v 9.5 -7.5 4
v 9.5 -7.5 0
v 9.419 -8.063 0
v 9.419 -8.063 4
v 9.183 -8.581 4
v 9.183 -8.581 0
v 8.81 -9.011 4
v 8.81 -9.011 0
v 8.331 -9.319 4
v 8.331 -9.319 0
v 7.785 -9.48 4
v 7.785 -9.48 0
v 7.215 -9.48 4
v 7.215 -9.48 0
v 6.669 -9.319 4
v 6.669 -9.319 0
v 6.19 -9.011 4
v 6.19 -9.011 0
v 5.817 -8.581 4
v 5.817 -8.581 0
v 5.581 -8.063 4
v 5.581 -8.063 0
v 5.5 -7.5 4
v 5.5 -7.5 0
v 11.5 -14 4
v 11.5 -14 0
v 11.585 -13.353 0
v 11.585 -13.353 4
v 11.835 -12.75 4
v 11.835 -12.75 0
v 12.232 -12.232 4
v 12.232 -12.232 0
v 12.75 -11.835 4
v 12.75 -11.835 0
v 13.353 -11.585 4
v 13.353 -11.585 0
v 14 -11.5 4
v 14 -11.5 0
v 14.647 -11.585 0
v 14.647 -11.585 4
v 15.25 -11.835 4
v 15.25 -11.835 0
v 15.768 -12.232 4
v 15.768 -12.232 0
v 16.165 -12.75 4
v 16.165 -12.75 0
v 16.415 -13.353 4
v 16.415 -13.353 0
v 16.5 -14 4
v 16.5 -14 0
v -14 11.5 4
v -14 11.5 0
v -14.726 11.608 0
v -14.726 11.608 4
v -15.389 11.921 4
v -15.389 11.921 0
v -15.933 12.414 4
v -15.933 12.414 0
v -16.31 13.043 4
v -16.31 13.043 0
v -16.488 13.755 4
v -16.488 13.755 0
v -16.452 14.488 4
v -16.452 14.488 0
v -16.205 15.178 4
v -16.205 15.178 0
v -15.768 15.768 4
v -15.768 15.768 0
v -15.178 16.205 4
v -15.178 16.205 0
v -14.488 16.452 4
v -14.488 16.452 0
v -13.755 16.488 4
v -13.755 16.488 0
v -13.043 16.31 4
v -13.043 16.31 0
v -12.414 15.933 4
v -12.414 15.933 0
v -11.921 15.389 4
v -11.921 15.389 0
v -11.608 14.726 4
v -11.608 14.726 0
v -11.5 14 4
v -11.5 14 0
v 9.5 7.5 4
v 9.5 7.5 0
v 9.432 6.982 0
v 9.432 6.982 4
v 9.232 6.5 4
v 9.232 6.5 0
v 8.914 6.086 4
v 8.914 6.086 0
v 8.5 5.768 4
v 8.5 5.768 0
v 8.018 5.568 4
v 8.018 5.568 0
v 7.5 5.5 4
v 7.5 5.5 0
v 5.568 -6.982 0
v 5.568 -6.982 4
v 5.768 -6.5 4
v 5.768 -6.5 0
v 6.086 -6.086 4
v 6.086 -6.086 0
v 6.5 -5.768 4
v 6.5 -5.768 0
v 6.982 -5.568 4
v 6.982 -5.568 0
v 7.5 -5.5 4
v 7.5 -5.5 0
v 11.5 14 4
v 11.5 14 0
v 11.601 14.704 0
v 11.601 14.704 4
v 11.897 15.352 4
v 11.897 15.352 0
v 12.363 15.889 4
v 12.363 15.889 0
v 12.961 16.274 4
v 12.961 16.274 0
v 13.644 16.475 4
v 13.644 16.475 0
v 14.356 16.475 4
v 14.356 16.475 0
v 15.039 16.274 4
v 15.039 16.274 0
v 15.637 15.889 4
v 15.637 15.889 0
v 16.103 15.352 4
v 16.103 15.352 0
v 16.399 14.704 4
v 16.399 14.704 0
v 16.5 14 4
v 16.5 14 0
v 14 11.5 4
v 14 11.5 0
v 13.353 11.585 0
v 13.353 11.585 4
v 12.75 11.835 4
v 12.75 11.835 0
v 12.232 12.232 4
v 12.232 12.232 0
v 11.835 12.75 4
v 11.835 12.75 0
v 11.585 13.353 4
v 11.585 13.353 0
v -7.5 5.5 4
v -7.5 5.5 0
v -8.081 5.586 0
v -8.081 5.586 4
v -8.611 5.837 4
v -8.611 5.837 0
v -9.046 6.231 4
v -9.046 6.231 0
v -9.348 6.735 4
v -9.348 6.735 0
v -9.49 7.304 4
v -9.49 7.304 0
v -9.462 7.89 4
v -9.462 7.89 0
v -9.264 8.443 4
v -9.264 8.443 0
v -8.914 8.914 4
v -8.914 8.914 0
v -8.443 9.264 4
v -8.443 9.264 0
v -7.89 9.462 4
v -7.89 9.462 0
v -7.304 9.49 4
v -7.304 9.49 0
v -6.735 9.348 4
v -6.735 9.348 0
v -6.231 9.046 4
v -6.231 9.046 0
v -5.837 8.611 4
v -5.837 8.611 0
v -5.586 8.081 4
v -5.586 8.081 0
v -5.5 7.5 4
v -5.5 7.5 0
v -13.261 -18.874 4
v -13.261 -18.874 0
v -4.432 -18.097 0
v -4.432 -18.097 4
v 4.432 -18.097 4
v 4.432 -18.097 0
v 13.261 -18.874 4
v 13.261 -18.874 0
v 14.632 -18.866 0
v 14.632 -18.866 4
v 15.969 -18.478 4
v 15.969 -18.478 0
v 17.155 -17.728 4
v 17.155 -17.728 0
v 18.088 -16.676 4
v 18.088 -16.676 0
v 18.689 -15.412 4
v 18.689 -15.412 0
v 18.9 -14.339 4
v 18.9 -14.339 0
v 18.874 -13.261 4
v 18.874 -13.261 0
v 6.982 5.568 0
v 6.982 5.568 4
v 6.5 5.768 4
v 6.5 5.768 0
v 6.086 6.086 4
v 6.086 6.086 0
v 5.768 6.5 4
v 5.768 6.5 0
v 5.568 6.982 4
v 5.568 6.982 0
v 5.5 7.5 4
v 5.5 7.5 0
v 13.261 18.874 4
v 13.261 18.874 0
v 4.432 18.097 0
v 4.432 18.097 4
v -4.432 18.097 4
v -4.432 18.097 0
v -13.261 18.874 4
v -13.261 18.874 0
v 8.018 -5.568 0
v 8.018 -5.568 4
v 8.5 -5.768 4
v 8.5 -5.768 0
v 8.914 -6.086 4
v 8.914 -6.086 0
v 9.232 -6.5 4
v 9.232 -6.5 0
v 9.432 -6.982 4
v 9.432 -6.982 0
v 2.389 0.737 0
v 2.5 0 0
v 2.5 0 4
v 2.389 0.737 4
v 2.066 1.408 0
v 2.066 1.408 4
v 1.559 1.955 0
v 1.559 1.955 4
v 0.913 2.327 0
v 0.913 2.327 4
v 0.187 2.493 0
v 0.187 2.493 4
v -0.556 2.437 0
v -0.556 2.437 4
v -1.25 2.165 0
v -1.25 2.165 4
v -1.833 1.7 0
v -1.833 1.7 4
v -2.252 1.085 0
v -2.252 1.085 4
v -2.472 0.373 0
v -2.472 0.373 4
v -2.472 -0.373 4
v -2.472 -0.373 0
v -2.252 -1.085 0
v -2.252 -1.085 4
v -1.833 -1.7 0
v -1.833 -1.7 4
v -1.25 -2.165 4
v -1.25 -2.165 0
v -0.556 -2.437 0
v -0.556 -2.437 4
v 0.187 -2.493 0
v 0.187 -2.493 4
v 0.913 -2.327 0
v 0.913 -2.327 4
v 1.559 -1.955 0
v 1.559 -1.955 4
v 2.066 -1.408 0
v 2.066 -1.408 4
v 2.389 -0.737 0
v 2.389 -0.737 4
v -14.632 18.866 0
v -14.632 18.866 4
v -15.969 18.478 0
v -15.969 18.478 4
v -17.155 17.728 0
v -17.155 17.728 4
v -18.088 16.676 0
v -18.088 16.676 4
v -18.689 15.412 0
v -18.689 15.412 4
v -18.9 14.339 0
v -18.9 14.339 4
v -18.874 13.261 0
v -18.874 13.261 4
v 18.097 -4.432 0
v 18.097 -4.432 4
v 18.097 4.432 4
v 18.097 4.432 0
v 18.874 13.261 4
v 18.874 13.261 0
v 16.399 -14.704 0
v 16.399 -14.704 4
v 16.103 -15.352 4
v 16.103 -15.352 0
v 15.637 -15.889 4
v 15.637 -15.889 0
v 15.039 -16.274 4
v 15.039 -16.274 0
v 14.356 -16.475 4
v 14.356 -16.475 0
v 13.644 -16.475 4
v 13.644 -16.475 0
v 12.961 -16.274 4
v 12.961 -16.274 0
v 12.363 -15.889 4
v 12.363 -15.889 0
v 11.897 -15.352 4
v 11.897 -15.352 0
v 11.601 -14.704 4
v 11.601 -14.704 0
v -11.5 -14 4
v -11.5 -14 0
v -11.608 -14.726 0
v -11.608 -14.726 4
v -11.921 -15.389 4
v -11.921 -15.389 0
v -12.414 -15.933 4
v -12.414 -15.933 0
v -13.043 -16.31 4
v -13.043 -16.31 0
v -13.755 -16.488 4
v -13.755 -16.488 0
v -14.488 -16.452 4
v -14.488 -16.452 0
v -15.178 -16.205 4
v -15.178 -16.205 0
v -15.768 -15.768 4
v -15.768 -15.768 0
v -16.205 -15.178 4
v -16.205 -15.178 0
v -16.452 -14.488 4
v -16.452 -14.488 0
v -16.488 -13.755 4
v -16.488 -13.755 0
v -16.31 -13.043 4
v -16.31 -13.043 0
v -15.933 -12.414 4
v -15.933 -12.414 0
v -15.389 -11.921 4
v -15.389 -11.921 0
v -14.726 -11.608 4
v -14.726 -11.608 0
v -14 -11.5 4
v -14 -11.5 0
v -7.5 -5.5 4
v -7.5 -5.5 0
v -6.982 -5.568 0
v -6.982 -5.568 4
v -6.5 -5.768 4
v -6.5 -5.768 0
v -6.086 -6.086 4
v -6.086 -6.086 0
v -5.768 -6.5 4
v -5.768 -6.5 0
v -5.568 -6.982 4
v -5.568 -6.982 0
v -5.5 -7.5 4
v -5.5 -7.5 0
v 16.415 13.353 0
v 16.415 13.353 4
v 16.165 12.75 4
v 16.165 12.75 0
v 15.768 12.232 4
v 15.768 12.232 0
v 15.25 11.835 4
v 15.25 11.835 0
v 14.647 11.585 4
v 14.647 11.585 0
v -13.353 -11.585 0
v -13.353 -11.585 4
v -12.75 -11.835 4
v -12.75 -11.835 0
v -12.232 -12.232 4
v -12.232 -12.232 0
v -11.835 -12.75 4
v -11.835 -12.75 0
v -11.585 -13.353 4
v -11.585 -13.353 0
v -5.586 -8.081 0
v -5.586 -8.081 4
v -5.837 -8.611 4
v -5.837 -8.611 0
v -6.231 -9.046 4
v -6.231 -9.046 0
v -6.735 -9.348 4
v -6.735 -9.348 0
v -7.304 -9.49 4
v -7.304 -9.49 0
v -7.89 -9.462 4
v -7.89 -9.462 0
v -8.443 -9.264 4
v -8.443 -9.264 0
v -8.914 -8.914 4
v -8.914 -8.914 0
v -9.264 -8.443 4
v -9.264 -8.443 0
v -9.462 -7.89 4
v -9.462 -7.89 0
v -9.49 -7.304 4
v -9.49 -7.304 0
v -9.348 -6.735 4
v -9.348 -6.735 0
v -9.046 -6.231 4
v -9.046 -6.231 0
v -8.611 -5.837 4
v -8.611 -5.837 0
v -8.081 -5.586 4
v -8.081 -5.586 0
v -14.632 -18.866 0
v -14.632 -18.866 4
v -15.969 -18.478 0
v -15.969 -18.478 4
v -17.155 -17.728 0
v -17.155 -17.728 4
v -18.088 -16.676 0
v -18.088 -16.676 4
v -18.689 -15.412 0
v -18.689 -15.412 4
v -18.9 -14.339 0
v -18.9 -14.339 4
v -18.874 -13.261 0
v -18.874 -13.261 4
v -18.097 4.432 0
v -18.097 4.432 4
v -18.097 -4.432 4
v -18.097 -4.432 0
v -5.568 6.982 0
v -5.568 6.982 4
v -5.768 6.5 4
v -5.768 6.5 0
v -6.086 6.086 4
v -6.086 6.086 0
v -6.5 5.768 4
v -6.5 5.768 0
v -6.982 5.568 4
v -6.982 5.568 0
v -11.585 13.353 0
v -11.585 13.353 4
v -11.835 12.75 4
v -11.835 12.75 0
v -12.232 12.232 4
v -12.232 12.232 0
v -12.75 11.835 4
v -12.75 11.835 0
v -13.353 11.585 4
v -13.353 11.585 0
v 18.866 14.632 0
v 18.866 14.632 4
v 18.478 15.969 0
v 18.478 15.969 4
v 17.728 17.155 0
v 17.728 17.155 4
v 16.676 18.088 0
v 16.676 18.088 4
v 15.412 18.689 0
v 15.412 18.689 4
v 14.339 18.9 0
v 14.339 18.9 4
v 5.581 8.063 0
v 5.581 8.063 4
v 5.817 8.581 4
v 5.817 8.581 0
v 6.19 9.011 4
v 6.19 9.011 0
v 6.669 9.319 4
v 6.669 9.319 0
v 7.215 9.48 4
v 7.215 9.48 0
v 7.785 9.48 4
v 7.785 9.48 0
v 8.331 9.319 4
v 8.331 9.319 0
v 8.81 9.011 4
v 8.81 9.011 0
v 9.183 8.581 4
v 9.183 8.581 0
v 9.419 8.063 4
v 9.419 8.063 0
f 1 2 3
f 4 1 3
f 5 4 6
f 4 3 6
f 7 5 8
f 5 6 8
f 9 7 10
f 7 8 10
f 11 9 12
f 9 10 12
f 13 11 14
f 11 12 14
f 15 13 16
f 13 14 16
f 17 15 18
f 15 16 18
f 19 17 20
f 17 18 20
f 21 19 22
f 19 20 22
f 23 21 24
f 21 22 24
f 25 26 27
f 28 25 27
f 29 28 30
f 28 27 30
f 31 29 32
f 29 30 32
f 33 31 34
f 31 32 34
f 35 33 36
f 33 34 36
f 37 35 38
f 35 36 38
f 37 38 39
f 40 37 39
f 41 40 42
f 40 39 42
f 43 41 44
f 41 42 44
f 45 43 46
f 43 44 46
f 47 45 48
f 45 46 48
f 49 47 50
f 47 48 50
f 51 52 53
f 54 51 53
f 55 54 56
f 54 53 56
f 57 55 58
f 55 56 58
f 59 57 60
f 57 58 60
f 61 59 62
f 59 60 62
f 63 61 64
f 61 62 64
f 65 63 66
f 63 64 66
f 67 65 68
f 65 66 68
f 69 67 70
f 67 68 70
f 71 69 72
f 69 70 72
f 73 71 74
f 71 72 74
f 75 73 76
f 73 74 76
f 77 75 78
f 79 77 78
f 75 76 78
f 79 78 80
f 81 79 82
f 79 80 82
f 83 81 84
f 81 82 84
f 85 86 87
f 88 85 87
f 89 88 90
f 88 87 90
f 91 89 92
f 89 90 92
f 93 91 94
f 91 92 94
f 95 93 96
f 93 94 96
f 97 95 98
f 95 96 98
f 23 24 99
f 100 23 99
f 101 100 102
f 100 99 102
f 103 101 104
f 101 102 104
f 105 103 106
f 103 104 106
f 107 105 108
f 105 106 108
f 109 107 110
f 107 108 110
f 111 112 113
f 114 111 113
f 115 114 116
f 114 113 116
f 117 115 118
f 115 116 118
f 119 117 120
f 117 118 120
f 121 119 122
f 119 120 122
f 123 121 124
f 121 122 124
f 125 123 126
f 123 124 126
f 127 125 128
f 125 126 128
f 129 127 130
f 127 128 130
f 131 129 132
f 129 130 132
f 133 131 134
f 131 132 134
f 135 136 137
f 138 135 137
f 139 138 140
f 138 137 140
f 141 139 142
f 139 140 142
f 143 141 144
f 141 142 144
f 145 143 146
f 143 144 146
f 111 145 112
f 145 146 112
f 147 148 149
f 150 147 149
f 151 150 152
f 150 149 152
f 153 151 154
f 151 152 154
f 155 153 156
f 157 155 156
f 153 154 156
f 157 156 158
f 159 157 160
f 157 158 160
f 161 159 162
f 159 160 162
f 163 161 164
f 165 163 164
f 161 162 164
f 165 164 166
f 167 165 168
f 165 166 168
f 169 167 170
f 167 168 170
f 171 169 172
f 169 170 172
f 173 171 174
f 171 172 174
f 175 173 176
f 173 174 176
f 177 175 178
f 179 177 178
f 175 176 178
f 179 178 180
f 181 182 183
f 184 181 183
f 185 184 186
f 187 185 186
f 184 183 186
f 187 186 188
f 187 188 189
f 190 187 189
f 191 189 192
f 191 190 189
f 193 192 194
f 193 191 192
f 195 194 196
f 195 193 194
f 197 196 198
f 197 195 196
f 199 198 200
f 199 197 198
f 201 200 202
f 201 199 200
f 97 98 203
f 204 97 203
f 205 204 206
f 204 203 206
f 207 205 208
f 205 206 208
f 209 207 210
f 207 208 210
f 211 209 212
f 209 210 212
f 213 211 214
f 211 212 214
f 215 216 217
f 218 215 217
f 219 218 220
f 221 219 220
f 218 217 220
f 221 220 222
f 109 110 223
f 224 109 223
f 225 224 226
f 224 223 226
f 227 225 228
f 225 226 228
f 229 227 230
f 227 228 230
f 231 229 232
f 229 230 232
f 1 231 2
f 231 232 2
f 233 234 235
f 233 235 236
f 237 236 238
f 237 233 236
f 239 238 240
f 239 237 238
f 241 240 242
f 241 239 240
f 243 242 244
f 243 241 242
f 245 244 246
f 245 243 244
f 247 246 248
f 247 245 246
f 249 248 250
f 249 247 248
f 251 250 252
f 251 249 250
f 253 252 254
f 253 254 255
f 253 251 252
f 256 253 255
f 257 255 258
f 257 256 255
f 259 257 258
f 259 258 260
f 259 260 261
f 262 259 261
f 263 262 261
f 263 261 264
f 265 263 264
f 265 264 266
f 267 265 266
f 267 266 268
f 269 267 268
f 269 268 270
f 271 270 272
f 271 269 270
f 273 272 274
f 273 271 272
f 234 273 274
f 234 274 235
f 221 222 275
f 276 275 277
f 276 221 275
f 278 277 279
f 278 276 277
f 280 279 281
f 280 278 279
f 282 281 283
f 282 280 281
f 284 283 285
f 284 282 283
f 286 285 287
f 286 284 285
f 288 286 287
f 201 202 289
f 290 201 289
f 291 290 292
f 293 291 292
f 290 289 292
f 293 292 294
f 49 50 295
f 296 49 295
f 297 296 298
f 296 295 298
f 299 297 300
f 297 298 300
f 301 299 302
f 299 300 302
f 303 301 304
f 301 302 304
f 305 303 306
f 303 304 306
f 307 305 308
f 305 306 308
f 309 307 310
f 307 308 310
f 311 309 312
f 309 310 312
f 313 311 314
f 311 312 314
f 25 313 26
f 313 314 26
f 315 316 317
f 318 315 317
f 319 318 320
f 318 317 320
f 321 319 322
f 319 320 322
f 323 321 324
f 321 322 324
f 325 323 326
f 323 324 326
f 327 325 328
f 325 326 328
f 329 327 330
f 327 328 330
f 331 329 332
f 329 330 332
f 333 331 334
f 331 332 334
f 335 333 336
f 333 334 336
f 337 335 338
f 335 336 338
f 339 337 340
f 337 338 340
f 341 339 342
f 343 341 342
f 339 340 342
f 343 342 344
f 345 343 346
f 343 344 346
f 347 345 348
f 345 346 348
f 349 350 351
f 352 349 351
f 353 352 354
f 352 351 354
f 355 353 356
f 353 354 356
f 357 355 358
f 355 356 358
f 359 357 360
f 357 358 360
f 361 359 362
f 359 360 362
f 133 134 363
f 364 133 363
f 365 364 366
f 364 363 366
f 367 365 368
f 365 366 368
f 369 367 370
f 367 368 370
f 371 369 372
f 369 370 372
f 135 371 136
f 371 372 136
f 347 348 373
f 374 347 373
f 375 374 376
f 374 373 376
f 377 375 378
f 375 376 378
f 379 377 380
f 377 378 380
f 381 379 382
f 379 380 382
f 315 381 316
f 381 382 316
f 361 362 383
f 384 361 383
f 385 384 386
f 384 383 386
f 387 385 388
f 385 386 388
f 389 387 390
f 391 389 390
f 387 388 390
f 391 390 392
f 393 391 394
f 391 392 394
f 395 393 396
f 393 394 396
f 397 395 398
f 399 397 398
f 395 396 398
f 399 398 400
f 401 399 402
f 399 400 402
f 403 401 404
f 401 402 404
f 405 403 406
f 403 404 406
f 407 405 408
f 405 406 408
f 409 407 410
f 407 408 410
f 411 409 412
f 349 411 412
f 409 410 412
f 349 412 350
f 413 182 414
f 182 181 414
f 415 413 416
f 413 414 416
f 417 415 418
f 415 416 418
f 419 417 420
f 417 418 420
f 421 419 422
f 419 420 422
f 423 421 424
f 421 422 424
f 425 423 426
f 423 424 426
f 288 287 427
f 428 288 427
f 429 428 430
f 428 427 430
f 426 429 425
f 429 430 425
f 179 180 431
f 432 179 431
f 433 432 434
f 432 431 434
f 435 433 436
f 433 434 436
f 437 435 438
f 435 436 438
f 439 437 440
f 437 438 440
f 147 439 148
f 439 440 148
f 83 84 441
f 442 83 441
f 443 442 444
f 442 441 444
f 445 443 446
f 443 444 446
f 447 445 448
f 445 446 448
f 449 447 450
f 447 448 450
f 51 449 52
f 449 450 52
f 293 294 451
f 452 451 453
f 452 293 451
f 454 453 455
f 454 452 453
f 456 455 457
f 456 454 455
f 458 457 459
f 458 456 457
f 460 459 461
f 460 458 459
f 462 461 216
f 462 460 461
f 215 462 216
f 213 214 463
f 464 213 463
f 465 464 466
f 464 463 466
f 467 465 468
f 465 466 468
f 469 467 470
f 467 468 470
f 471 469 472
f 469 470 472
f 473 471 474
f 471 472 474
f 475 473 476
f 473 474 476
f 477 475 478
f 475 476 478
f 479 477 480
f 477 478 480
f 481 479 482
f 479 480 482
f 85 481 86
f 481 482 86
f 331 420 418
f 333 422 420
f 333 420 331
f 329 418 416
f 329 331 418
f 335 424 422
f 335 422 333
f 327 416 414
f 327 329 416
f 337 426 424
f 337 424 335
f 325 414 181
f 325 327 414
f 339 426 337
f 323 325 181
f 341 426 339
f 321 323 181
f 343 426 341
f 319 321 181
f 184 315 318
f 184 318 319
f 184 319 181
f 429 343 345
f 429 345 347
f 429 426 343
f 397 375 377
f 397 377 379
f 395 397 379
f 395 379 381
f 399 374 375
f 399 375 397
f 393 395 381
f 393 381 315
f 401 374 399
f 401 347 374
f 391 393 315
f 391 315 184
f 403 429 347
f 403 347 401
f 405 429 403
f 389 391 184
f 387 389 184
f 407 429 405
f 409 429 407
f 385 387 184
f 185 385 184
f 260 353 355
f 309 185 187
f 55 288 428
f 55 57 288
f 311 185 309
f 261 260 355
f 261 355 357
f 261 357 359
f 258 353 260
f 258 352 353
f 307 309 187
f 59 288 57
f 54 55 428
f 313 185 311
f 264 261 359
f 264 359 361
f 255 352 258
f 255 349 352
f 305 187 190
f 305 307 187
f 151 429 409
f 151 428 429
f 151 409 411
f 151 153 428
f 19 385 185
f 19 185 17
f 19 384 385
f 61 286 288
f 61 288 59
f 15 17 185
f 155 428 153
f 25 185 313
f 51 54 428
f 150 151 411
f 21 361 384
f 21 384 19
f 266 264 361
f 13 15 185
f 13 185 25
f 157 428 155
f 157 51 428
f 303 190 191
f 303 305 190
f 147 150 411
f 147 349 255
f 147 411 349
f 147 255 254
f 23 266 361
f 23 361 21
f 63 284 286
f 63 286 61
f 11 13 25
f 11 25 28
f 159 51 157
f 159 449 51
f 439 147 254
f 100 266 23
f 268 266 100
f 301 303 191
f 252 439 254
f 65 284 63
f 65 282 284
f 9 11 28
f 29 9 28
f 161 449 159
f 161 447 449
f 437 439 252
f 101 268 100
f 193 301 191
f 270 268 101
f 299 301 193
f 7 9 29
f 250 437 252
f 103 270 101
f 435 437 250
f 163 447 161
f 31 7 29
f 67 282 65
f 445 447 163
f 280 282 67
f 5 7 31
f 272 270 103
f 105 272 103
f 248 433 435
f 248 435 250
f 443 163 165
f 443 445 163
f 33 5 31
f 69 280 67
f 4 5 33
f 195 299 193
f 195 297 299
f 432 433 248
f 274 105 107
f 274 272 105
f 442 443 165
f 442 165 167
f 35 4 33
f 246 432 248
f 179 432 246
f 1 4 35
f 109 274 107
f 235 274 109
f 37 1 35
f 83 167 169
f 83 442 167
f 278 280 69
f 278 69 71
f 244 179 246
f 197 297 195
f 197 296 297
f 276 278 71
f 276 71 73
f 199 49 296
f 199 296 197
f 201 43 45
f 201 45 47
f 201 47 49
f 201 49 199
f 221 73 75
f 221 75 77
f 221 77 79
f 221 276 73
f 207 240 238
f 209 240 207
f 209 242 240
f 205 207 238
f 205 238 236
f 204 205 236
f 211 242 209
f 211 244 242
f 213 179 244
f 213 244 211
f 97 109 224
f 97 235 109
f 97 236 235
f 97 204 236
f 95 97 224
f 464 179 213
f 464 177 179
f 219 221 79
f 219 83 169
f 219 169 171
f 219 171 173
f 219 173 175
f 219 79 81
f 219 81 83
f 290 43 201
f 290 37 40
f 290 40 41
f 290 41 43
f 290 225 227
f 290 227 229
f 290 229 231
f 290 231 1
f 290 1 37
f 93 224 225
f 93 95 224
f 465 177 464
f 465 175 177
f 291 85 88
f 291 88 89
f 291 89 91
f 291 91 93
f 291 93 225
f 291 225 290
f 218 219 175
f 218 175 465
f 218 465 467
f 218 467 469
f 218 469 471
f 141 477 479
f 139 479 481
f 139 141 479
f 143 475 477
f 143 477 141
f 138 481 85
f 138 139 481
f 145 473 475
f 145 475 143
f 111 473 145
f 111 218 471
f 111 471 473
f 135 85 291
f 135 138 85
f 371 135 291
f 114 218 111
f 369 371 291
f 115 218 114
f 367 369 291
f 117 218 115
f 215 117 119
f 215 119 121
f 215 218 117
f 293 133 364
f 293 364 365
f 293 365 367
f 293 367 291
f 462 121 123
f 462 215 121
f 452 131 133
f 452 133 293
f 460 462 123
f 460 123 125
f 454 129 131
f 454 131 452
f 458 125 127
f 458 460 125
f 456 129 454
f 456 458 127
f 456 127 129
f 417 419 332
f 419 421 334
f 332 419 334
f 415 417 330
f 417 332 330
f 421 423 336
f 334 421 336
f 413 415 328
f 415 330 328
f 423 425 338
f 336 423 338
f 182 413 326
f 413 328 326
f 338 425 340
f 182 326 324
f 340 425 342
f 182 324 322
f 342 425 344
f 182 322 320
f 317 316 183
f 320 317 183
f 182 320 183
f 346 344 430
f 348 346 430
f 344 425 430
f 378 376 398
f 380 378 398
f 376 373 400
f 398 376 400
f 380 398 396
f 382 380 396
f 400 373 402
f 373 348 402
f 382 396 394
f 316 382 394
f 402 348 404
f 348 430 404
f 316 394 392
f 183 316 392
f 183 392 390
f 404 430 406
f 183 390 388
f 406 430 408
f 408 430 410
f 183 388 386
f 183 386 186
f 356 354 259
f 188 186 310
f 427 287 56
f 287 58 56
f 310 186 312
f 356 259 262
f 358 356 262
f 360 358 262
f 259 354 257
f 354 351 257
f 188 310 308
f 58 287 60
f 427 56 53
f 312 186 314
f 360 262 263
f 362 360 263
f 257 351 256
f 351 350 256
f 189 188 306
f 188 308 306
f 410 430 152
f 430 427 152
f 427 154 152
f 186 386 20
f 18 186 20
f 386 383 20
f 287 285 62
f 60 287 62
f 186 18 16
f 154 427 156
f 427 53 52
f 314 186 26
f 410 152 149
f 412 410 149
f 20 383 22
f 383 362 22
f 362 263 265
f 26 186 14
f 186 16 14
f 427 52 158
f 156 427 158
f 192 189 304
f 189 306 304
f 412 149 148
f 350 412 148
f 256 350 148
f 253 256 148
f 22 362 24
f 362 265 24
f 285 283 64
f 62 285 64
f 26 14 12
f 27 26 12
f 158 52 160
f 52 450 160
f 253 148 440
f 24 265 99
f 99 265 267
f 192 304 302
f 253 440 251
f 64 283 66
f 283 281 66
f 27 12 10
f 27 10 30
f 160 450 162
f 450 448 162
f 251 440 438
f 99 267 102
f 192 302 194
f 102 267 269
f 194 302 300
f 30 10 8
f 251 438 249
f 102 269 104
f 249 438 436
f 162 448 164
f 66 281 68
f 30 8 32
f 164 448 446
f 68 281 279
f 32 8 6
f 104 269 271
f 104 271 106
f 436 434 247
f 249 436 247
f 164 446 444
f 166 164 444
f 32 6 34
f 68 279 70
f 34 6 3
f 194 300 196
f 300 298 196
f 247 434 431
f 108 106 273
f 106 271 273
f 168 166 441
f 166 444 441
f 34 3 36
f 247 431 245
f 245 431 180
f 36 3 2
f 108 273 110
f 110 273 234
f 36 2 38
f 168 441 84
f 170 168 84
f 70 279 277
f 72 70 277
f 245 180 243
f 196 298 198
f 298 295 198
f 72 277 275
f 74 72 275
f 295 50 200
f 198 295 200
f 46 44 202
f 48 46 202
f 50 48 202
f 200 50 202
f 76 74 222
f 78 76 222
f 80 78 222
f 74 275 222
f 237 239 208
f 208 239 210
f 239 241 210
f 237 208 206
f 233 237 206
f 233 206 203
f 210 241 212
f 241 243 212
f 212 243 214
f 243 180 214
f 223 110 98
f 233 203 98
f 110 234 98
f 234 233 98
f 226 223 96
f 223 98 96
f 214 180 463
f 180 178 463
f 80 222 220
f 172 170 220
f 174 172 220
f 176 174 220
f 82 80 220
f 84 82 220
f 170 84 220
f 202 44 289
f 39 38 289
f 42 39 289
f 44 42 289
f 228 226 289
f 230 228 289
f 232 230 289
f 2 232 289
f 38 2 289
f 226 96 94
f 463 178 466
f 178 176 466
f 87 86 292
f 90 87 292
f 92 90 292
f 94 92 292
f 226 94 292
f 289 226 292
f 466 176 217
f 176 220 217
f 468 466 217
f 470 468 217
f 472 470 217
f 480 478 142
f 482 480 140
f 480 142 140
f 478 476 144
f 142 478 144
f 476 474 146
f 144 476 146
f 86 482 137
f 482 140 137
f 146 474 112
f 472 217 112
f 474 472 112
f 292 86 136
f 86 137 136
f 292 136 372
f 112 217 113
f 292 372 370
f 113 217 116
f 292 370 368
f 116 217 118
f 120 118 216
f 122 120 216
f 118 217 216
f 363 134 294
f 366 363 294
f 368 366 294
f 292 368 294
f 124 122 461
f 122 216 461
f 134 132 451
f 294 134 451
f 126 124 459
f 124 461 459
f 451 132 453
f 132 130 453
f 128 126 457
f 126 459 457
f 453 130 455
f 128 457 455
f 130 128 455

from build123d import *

# Parameters (mm, degrees)
F0_R     = 2.5
F1_DEPTH = 4
F2_R     = 5


with BuildPart() as f1:
    # F0 (on Top) → F1 (new body)
    with BuildSketch(Plane.XY):
        with BuildLine():
            ThreePointArc((-20, -20), (0, -18), (20, -20))
            ThreePointArc((20, -20), (18, 0), (20, 20))
            ThreePointArc((20, 20), (0, 18), (-20, 20))
            ThreePointArc((-20, 20), (-18, 0), (-20, -20))
        make_face()
        with BuildLine():
            ThreePointArc((16.5, 14), (15.767766953, 12.232233047), (14, 11.5))
            Line((14, 11.5), (14, -11.5))
            ThreePointArc((14, -11.5), (15.767766953, -12.232233047), (16.5, -14))
            ThreePointArc((16.5, -14), (14, -16.5), (11.5, -14))
            Line((11.5, -14), (-11.5, -14))
            ThreePointArc((-11.5, -14), (-15.767766953, -15.767766953), (-14, -11.5))
            Line((-14, -11.5), (-14, 11.5))
            ThreePointArc((-14, 11.5), (-15.767766953, 15.767766953), (-11.5, 14))
            Line((-11.5, 14), (11.5, 14))
            ThreePointArc((11.5, 14), (14, 16.5), (16.5, 14))
        make_face(mode=Mode.SUBTRACT)
        with BuildLine():
            Line((14, -11.5), (14, 11.5))
            ThreePointArc((14, 11.5), (12.232233047, 12.232233047), (11.5, 14))
            Line((11.5, 14), (-11.5, 14))
            ThreePointArc((-11.5, 14), (-12.232233047, 12.232233047), (-14, 11.5))
            Line((-14, 11.5), (-14, -11.5))
            ThreePointArc((-14, -11.5), (-12.232233047, -12.232233047), (-11.5, -14))
            Line((-11.5, -14), (11.5, -14))
            ThreePointArc((11.5, -14), (12.232233047, -12.232233047), (14, -11.5))
        make_face()
        with BuildLine():
            Line((2.5, -7.5), (-2.5, -7.5))
            ThreePointArc((-2.5, -7.5), (-11.0355339059, -11.0355339059), (-7.5, -2.5))
            Line((-7.5, -2.5), (-7.5, 2.5))
            ThreePointArc((-7.5, 2.5), (-11.0355339059, 11.0355339059), (-2.5, 7.5))
            Line((-2.5, 7.5), (2.5, 7.5))
            ThreePointArc((2.5, 7.5), (7.5, 12.5), (12.5, 7.5))
            ThreePointArc((12.5, 7.5), (11.0355339059, 3.9644660941), (7.5, 2.5))
            Line((7.5, 2.5), (7.5, -2.5))
            ThreePointArc((7.5, -2.5), (11.0355339059, -3.9644660941), (12.5, -7.5))
            ThreePointArc((12.5, -7.5), (7.5, -12.5), (2.5, -7.5))
        make_face(mode=Mode.SUBTRACT)
        with BuildLine():
            ThreePointArc((-7.5, -2.5), (-3.9644660941, -3.9644660941), (-2.5, -7.5))
            Line((-2.5, -7.5), (2.5, -7.5))
            ThreePointArc((2.5, -7.5), (3.9644660941, -3.9644660941), (7.5, -2.5))
            Line((7.5, -2.5), (7.5, 2.5))
            ThreePointArc((7.5, 2.5), (3.9644660941, 3.9644660941), (2.5, 7.5))
            Line((2.5, 7.5), (-2.5, 7.5))
            ThreePointArc((-2.5, 7.5), (-3.9644660941, 3.9644660941), (-7.5, 2.5))
            Line((-7.5, 2.5), (-7.5, -2.5))
        make_face()
        Circle(F0_R, mode=Mode.SUBTRACT)
        with BuildLine():
            Line((-7.5, 5.5), (-7.5, 2.5))
            ThreePointArc((-7.5, 2.5), (-3.9644660941, 3.9644660941), (-2.5, 7.5))
            Line((-2.5, 7.5), (-5.5, 7.5))
            ThreePointArc((-5.5, 7.5), (-6.0857864376, 6.0857864376), (-7.5, 5.5))
        make_face()
        with BuildLine():
            ThreePointArc((-2.5, 7.5), (-11.0355339059, 11.0355339059), (-7.5, 2.5))
            Line((-7.5, 2.5), (-7.5, 5.5))
            ThreePointArc((-7.5, 5.5), (-8.9142135624, 8.9142135624), (-5.5, 7.5))
            Line((-5.5, 7.5), (-2.5, 7.5))
        make_face()
        with BuildLine():
            Line((7.5, 5.5), (7.5, 2.5))
            ThreePointArc((7.5, 2.5), (11.0355339059, 3.9644660941), (12.5, 7.5))
            ThreePointArc((12.5, 7.5), (7.5, 12.5), (2.5, 7.5))
            Line((2.5, 7.5), (5.5, 7.5))
            ThreePointArc((5.5, 7.5), (7.5, 9.5), (9.5, 7.5))
            ThreePointArc((9.5, 7.5), (8.9142135624, 6.0857864376), (7.5, 5.5))
        make_face()
        with BuildLine():
            ThreePointArc((2.5, 7.5), (3.9644660941, 3.9644660941), (7.5, 2.5))
            Line((7.5, 2.5), (7.5, 5.5))
            ThreePointArc((7.5, 5.5), (6.0857864376, 6.0857864376), (5.5, 7.5))
            Line((5.5, 7.5), (2.5, 7.5))
        make_face()
        with BuildLine():
            ThreePointArc((-7.5, -2.5), (-11.0355339059, -11.0355339059), (-2.5, -7.5))
            Line((-2.5, -7.5), (-5.5, -7.5))
            ThreePointArc((-5.5, -7.5), (-8.9142135624, -8.9142135624), (-7.5, -5.5))
            Line((-7.5, -5.5), (-7.5, -2.5))
        make_face()
        with BuildLine():
            Line((5.5, -7.5), (2.5, -7.5))
            ThreePointArc((2.5, -7.5), (7.5, -12.5), (12.5, -7.5))
            ThreePointArc((12.5, -7.5), (11.0355339059, -3.9644660941), (7.5, -2.5))
            Line((7.5, -2.5), (7.5, -5.5))
            ThreePointArc((7.5, -5.5), (8.9142135624, -6.0857864376), (9.5, -7.5))
            ThreePointArc((9.5, -7.5), (7.5, -9.5), (5.5, -7.5))
        make_face()
        with BuildLine():
            ThreePointArc((7.5, -2.5), (3.9644660941, -3.9644660941), (2.5, -7.5))
            Line((2.5, -7.5), (5.5, -7.5))
            ThreePointArc((5.5, -7.5), (6.0857864376, -6.0857864376), (7.5, -5.5))
            Line((7.5, -5.5), (7.5, -2.5))
        make_face()
        with BuildLine():
            Line((-5.5, -7.5), (-2.5, -7.5))
            ThreePointArc((-2.5, -7.5), (-3.9644660941, -3.9644660941), (-7.5, -2.5))
            Line((-7.5, -2.5), (-7.5, -5.5))
            ThreePointArc((-7.5, -5.5), (-6.0857864376, -6.0857864376), (-5.5, -7.5))
        make_face()
    extrude(amount=F1_DEPTH)

    # F2
    f2_edges = [f1.edges().sort_by_distance(p)[0] for p in [
        (20, -20, 2),
        (20, 20, 2),
        (-20, -20, 2),
        (-20, 20, 2),
    ]]
    fillet(f2_edges, radius=F2_R)


solid = f1.part
